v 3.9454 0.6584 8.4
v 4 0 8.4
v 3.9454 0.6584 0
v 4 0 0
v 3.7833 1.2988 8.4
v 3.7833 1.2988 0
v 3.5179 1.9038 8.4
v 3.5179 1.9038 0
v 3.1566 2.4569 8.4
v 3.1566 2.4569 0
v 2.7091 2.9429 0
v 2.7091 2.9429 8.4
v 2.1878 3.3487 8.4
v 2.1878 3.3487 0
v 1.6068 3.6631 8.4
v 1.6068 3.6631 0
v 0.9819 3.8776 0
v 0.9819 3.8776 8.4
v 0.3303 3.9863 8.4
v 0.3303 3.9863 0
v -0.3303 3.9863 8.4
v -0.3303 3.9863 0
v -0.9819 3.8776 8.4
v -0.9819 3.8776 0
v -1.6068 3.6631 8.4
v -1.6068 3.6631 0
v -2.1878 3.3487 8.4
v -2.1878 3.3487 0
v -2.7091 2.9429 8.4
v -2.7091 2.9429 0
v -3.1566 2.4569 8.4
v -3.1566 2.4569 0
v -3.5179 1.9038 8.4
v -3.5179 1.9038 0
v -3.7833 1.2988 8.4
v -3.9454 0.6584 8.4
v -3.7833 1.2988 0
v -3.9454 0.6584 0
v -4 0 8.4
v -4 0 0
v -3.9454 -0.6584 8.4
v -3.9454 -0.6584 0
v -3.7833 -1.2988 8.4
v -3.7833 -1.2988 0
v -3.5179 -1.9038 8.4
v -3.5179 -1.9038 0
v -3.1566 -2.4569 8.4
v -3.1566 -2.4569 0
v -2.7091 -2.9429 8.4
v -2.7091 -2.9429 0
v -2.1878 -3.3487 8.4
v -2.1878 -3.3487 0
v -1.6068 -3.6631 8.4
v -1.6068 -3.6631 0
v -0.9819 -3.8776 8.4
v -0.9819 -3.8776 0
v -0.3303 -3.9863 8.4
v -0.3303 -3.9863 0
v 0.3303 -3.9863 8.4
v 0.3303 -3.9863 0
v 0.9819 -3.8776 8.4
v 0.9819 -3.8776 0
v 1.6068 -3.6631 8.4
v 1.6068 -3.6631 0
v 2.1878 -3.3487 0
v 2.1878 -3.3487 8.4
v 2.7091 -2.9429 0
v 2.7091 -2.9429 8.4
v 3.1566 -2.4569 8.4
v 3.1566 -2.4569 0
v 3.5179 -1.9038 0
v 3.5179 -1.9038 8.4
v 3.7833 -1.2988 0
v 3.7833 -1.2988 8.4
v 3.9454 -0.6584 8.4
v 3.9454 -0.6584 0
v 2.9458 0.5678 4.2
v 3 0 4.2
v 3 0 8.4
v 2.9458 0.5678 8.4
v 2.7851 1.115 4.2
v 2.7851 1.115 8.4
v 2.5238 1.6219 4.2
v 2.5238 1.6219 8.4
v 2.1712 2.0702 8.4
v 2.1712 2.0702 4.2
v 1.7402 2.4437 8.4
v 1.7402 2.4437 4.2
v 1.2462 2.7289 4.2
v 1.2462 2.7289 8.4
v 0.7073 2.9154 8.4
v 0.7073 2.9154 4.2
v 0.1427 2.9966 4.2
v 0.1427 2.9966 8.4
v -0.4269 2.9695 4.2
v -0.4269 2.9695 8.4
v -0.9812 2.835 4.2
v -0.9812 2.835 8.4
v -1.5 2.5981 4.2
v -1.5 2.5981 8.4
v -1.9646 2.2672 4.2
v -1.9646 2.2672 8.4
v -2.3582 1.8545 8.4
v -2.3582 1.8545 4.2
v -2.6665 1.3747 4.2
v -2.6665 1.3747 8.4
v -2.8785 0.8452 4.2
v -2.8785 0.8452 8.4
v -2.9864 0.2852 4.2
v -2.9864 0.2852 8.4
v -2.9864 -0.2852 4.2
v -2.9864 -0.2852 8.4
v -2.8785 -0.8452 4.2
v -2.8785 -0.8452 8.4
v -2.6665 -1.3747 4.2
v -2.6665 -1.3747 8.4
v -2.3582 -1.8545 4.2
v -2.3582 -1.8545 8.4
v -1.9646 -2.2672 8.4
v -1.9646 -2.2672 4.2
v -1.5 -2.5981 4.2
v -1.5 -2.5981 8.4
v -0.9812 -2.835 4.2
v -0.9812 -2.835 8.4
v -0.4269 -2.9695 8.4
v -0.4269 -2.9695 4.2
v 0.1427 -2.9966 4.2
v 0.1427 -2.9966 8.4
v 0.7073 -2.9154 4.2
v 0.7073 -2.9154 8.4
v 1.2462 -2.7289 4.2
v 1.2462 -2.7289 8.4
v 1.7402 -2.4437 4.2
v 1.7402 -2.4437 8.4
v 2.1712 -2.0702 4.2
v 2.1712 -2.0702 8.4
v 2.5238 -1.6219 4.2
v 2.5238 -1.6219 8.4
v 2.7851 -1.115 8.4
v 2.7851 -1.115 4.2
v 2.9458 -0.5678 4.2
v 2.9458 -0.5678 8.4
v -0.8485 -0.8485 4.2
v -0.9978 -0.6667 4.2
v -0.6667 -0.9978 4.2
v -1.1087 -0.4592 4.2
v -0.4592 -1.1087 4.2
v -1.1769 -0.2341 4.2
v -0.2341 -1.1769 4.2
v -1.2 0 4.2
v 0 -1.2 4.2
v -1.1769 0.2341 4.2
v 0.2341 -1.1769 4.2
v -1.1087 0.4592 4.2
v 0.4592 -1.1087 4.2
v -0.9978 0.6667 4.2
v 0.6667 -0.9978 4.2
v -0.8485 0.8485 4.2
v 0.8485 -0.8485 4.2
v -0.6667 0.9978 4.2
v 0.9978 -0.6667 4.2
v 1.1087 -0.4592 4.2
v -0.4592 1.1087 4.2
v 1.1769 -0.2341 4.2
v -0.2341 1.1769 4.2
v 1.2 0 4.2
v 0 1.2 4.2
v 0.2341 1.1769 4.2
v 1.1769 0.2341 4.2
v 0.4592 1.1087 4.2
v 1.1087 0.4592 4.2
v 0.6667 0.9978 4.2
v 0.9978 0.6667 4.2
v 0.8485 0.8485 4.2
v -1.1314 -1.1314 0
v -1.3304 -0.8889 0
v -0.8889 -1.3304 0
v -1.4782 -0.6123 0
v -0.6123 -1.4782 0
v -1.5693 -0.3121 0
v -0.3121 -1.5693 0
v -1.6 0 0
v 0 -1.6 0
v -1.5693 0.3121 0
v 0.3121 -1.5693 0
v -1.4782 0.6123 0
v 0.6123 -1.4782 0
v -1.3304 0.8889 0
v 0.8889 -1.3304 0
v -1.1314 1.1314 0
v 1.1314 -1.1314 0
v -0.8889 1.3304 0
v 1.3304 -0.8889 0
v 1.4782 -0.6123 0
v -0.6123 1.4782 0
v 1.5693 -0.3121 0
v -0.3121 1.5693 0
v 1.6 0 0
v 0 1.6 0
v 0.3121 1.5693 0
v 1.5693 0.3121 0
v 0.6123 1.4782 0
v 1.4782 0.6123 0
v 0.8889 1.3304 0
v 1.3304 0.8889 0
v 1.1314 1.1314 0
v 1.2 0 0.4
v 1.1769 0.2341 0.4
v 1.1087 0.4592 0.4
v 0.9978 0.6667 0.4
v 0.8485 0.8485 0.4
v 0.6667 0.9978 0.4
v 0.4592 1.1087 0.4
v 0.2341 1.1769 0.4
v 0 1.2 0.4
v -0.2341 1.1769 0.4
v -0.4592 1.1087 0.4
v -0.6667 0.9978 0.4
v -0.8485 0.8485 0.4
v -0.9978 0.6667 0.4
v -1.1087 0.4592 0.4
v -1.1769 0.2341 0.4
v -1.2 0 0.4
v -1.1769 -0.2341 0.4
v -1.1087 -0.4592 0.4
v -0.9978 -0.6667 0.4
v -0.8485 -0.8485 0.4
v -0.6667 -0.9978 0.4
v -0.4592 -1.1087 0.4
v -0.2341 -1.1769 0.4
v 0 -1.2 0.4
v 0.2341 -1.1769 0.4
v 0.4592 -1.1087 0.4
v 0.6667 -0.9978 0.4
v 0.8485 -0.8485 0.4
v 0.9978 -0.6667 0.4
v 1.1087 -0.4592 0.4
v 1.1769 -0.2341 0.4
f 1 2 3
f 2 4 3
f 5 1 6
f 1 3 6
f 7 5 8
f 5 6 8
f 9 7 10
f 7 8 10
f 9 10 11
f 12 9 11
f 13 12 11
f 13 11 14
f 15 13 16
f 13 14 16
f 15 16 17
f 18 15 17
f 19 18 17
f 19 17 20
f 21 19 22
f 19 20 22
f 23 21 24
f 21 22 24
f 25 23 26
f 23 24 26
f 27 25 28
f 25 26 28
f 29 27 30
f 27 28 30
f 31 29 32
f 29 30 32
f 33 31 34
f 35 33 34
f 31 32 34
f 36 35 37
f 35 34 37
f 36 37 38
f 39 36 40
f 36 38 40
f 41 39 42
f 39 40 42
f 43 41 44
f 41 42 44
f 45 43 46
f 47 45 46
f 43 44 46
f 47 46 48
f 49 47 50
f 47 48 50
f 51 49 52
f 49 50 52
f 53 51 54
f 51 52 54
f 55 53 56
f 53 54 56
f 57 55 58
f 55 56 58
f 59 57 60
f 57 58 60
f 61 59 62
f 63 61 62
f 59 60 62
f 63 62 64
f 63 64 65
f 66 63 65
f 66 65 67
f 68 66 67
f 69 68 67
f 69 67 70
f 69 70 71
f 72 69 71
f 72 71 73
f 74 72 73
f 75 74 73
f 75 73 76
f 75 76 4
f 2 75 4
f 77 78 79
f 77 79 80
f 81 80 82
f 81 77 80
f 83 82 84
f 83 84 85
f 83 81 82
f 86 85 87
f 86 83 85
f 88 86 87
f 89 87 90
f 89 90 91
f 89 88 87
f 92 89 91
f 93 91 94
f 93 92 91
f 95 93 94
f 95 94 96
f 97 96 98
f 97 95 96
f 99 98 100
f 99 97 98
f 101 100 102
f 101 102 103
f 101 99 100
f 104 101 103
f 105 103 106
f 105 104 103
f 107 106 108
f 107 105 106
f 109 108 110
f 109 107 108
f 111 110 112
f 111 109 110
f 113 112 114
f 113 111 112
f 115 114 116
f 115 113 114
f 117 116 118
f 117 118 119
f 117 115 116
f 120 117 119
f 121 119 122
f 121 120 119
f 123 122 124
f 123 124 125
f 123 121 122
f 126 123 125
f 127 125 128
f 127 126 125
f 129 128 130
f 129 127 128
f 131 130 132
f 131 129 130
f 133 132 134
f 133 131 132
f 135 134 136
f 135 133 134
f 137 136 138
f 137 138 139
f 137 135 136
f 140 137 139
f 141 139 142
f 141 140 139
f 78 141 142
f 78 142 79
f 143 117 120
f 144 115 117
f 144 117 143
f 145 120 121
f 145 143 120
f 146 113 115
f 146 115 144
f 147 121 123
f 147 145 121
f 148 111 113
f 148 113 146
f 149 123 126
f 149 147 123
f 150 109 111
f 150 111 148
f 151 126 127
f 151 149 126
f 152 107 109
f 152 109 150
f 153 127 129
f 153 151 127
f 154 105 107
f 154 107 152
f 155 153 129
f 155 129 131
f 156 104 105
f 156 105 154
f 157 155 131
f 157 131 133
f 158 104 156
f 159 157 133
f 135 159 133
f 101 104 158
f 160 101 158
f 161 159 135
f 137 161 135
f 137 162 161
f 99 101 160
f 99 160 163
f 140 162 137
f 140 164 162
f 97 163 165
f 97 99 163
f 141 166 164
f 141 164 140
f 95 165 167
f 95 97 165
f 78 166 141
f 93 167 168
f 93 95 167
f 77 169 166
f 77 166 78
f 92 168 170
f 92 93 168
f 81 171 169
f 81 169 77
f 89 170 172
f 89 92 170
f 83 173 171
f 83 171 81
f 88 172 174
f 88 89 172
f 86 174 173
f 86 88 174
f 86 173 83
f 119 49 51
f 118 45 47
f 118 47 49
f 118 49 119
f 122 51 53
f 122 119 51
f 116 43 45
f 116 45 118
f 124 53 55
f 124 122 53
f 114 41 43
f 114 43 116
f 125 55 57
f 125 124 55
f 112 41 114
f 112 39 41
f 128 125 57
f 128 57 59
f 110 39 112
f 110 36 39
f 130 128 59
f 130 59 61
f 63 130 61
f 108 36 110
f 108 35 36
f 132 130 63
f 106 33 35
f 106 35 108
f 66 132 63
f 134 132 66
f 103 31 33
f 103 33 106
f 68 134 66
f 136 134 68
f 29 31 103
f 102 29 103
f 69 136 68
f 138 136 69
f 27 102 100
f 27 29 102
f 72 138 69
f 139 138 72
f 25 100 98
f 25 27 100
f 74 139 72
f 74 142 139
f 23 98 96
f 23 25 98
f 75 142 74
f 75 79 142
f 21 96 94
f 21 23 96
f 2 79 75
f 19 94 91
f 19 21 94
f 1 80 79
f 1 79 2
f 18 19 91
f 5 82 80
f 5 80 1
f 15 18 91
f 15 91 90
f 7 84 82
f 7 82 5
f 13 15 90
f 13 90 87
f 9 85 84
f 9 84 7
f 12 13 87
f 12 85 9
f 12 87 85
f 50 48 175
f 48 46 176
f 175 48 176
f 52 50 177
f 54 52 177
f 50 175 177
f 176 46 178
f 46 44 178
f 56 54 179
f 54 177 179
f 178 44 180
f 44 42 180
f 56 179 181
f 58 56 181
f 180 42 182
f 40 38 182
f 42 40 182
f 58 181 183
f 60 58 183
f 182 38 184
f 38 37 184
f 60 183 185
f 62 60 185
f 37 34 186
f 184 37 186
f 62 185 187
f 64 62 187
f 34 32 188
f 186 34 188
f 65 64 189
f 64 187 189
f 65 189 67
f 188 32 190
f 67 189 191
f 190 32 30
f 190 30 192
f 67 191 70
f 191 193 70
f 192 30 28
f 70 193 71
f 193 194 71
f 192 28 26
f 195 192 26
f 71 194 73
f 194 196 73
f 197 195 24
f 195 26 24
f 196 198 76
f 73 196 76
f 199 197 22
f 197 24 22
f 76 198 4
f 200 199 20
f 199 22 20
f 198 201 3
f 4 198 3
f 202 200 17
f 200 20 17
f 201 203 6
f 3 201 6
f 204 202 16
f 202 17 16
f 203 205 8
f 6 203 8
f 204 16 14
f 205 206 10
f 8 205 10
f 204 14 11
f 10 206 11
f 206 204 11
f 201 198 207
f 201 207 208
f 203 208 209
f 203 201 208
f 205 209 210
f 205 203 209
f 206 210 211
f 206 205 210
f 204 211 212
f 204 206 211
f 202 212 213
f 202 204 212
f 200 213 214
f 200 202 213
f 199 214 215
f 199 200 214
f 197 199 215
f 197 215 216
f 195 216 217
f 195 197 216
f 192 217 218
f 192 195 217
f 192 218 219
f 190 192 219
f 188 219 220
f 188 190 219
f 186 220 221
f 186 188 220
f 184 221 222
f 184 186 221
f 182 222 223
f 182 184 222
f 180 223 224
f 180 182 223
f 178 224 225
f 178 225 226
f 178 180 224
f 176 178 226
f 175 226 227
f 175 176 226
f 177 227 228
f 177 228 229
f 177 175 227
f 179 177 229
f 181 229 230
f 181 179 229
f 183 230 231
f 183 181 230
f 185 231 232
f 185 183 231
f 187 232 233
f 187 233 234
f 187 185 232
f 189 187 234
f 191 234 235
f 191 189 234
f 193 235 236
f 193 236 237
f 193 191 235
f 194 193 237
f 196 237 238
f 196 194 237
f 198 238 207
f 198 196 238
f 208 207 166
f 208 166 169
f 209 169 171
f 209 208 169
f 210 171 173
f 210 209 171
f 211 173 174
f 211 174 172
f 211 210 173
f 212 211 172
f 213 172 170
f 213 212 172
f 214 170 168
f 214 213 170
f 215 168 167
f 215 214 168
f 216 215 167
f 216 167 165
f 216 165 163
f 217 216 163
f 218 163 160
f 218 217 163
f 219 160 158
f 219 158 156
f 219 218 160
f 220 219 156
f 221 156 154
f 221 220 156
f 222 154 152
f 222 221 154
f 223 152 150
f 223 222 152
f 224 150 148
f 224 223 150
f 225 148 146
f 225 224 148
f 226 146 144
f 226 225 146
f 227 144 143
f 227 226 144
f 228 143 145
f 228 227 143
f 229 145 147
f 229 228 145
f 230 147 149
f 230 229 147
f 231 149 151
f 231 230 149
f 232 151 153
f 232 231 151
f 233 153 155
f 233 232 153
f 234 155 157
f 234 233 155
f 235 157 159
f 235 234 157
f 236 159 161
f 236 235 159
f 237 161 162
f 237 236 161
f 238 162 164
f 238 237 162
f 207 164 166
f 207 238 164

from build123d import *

# Parameters (mm, degrees)
F0_R     = 4
F0_R_2   = 1.2
F1_DEPTH = 4.2
F4_SIZE  = 0.4
F2_R     = 4
F2_R_2   = 3
F3_DEPTH = 4.2


with BuildPart() as f1:
    # F0 (on Top) → F1 (new body)
    with BuildSketch(Plane.XY):
        Circle(F0_R)
        Circle(F0_R_2, mode=Mode.SUBTRACT)
    extrude(amount=F1_DEPTH)

    # F4
    f4_edges = [f1.edges().sort_by_distance(p)[0] for p in [
        (-1.2, 0, 0),
    ]]
    chamfer(f4_edges, length=F4_SIZE)

    # F2 (on face) → F3 (join)
    with BuildSketch(Plane.XY.offset(4.2)):
        Circle(F2_R)
        Circle(F2_R_2, mode=Mode.SUBTRACT)
    extrude(amount=F3_DEPTH)


solid = f1.part
